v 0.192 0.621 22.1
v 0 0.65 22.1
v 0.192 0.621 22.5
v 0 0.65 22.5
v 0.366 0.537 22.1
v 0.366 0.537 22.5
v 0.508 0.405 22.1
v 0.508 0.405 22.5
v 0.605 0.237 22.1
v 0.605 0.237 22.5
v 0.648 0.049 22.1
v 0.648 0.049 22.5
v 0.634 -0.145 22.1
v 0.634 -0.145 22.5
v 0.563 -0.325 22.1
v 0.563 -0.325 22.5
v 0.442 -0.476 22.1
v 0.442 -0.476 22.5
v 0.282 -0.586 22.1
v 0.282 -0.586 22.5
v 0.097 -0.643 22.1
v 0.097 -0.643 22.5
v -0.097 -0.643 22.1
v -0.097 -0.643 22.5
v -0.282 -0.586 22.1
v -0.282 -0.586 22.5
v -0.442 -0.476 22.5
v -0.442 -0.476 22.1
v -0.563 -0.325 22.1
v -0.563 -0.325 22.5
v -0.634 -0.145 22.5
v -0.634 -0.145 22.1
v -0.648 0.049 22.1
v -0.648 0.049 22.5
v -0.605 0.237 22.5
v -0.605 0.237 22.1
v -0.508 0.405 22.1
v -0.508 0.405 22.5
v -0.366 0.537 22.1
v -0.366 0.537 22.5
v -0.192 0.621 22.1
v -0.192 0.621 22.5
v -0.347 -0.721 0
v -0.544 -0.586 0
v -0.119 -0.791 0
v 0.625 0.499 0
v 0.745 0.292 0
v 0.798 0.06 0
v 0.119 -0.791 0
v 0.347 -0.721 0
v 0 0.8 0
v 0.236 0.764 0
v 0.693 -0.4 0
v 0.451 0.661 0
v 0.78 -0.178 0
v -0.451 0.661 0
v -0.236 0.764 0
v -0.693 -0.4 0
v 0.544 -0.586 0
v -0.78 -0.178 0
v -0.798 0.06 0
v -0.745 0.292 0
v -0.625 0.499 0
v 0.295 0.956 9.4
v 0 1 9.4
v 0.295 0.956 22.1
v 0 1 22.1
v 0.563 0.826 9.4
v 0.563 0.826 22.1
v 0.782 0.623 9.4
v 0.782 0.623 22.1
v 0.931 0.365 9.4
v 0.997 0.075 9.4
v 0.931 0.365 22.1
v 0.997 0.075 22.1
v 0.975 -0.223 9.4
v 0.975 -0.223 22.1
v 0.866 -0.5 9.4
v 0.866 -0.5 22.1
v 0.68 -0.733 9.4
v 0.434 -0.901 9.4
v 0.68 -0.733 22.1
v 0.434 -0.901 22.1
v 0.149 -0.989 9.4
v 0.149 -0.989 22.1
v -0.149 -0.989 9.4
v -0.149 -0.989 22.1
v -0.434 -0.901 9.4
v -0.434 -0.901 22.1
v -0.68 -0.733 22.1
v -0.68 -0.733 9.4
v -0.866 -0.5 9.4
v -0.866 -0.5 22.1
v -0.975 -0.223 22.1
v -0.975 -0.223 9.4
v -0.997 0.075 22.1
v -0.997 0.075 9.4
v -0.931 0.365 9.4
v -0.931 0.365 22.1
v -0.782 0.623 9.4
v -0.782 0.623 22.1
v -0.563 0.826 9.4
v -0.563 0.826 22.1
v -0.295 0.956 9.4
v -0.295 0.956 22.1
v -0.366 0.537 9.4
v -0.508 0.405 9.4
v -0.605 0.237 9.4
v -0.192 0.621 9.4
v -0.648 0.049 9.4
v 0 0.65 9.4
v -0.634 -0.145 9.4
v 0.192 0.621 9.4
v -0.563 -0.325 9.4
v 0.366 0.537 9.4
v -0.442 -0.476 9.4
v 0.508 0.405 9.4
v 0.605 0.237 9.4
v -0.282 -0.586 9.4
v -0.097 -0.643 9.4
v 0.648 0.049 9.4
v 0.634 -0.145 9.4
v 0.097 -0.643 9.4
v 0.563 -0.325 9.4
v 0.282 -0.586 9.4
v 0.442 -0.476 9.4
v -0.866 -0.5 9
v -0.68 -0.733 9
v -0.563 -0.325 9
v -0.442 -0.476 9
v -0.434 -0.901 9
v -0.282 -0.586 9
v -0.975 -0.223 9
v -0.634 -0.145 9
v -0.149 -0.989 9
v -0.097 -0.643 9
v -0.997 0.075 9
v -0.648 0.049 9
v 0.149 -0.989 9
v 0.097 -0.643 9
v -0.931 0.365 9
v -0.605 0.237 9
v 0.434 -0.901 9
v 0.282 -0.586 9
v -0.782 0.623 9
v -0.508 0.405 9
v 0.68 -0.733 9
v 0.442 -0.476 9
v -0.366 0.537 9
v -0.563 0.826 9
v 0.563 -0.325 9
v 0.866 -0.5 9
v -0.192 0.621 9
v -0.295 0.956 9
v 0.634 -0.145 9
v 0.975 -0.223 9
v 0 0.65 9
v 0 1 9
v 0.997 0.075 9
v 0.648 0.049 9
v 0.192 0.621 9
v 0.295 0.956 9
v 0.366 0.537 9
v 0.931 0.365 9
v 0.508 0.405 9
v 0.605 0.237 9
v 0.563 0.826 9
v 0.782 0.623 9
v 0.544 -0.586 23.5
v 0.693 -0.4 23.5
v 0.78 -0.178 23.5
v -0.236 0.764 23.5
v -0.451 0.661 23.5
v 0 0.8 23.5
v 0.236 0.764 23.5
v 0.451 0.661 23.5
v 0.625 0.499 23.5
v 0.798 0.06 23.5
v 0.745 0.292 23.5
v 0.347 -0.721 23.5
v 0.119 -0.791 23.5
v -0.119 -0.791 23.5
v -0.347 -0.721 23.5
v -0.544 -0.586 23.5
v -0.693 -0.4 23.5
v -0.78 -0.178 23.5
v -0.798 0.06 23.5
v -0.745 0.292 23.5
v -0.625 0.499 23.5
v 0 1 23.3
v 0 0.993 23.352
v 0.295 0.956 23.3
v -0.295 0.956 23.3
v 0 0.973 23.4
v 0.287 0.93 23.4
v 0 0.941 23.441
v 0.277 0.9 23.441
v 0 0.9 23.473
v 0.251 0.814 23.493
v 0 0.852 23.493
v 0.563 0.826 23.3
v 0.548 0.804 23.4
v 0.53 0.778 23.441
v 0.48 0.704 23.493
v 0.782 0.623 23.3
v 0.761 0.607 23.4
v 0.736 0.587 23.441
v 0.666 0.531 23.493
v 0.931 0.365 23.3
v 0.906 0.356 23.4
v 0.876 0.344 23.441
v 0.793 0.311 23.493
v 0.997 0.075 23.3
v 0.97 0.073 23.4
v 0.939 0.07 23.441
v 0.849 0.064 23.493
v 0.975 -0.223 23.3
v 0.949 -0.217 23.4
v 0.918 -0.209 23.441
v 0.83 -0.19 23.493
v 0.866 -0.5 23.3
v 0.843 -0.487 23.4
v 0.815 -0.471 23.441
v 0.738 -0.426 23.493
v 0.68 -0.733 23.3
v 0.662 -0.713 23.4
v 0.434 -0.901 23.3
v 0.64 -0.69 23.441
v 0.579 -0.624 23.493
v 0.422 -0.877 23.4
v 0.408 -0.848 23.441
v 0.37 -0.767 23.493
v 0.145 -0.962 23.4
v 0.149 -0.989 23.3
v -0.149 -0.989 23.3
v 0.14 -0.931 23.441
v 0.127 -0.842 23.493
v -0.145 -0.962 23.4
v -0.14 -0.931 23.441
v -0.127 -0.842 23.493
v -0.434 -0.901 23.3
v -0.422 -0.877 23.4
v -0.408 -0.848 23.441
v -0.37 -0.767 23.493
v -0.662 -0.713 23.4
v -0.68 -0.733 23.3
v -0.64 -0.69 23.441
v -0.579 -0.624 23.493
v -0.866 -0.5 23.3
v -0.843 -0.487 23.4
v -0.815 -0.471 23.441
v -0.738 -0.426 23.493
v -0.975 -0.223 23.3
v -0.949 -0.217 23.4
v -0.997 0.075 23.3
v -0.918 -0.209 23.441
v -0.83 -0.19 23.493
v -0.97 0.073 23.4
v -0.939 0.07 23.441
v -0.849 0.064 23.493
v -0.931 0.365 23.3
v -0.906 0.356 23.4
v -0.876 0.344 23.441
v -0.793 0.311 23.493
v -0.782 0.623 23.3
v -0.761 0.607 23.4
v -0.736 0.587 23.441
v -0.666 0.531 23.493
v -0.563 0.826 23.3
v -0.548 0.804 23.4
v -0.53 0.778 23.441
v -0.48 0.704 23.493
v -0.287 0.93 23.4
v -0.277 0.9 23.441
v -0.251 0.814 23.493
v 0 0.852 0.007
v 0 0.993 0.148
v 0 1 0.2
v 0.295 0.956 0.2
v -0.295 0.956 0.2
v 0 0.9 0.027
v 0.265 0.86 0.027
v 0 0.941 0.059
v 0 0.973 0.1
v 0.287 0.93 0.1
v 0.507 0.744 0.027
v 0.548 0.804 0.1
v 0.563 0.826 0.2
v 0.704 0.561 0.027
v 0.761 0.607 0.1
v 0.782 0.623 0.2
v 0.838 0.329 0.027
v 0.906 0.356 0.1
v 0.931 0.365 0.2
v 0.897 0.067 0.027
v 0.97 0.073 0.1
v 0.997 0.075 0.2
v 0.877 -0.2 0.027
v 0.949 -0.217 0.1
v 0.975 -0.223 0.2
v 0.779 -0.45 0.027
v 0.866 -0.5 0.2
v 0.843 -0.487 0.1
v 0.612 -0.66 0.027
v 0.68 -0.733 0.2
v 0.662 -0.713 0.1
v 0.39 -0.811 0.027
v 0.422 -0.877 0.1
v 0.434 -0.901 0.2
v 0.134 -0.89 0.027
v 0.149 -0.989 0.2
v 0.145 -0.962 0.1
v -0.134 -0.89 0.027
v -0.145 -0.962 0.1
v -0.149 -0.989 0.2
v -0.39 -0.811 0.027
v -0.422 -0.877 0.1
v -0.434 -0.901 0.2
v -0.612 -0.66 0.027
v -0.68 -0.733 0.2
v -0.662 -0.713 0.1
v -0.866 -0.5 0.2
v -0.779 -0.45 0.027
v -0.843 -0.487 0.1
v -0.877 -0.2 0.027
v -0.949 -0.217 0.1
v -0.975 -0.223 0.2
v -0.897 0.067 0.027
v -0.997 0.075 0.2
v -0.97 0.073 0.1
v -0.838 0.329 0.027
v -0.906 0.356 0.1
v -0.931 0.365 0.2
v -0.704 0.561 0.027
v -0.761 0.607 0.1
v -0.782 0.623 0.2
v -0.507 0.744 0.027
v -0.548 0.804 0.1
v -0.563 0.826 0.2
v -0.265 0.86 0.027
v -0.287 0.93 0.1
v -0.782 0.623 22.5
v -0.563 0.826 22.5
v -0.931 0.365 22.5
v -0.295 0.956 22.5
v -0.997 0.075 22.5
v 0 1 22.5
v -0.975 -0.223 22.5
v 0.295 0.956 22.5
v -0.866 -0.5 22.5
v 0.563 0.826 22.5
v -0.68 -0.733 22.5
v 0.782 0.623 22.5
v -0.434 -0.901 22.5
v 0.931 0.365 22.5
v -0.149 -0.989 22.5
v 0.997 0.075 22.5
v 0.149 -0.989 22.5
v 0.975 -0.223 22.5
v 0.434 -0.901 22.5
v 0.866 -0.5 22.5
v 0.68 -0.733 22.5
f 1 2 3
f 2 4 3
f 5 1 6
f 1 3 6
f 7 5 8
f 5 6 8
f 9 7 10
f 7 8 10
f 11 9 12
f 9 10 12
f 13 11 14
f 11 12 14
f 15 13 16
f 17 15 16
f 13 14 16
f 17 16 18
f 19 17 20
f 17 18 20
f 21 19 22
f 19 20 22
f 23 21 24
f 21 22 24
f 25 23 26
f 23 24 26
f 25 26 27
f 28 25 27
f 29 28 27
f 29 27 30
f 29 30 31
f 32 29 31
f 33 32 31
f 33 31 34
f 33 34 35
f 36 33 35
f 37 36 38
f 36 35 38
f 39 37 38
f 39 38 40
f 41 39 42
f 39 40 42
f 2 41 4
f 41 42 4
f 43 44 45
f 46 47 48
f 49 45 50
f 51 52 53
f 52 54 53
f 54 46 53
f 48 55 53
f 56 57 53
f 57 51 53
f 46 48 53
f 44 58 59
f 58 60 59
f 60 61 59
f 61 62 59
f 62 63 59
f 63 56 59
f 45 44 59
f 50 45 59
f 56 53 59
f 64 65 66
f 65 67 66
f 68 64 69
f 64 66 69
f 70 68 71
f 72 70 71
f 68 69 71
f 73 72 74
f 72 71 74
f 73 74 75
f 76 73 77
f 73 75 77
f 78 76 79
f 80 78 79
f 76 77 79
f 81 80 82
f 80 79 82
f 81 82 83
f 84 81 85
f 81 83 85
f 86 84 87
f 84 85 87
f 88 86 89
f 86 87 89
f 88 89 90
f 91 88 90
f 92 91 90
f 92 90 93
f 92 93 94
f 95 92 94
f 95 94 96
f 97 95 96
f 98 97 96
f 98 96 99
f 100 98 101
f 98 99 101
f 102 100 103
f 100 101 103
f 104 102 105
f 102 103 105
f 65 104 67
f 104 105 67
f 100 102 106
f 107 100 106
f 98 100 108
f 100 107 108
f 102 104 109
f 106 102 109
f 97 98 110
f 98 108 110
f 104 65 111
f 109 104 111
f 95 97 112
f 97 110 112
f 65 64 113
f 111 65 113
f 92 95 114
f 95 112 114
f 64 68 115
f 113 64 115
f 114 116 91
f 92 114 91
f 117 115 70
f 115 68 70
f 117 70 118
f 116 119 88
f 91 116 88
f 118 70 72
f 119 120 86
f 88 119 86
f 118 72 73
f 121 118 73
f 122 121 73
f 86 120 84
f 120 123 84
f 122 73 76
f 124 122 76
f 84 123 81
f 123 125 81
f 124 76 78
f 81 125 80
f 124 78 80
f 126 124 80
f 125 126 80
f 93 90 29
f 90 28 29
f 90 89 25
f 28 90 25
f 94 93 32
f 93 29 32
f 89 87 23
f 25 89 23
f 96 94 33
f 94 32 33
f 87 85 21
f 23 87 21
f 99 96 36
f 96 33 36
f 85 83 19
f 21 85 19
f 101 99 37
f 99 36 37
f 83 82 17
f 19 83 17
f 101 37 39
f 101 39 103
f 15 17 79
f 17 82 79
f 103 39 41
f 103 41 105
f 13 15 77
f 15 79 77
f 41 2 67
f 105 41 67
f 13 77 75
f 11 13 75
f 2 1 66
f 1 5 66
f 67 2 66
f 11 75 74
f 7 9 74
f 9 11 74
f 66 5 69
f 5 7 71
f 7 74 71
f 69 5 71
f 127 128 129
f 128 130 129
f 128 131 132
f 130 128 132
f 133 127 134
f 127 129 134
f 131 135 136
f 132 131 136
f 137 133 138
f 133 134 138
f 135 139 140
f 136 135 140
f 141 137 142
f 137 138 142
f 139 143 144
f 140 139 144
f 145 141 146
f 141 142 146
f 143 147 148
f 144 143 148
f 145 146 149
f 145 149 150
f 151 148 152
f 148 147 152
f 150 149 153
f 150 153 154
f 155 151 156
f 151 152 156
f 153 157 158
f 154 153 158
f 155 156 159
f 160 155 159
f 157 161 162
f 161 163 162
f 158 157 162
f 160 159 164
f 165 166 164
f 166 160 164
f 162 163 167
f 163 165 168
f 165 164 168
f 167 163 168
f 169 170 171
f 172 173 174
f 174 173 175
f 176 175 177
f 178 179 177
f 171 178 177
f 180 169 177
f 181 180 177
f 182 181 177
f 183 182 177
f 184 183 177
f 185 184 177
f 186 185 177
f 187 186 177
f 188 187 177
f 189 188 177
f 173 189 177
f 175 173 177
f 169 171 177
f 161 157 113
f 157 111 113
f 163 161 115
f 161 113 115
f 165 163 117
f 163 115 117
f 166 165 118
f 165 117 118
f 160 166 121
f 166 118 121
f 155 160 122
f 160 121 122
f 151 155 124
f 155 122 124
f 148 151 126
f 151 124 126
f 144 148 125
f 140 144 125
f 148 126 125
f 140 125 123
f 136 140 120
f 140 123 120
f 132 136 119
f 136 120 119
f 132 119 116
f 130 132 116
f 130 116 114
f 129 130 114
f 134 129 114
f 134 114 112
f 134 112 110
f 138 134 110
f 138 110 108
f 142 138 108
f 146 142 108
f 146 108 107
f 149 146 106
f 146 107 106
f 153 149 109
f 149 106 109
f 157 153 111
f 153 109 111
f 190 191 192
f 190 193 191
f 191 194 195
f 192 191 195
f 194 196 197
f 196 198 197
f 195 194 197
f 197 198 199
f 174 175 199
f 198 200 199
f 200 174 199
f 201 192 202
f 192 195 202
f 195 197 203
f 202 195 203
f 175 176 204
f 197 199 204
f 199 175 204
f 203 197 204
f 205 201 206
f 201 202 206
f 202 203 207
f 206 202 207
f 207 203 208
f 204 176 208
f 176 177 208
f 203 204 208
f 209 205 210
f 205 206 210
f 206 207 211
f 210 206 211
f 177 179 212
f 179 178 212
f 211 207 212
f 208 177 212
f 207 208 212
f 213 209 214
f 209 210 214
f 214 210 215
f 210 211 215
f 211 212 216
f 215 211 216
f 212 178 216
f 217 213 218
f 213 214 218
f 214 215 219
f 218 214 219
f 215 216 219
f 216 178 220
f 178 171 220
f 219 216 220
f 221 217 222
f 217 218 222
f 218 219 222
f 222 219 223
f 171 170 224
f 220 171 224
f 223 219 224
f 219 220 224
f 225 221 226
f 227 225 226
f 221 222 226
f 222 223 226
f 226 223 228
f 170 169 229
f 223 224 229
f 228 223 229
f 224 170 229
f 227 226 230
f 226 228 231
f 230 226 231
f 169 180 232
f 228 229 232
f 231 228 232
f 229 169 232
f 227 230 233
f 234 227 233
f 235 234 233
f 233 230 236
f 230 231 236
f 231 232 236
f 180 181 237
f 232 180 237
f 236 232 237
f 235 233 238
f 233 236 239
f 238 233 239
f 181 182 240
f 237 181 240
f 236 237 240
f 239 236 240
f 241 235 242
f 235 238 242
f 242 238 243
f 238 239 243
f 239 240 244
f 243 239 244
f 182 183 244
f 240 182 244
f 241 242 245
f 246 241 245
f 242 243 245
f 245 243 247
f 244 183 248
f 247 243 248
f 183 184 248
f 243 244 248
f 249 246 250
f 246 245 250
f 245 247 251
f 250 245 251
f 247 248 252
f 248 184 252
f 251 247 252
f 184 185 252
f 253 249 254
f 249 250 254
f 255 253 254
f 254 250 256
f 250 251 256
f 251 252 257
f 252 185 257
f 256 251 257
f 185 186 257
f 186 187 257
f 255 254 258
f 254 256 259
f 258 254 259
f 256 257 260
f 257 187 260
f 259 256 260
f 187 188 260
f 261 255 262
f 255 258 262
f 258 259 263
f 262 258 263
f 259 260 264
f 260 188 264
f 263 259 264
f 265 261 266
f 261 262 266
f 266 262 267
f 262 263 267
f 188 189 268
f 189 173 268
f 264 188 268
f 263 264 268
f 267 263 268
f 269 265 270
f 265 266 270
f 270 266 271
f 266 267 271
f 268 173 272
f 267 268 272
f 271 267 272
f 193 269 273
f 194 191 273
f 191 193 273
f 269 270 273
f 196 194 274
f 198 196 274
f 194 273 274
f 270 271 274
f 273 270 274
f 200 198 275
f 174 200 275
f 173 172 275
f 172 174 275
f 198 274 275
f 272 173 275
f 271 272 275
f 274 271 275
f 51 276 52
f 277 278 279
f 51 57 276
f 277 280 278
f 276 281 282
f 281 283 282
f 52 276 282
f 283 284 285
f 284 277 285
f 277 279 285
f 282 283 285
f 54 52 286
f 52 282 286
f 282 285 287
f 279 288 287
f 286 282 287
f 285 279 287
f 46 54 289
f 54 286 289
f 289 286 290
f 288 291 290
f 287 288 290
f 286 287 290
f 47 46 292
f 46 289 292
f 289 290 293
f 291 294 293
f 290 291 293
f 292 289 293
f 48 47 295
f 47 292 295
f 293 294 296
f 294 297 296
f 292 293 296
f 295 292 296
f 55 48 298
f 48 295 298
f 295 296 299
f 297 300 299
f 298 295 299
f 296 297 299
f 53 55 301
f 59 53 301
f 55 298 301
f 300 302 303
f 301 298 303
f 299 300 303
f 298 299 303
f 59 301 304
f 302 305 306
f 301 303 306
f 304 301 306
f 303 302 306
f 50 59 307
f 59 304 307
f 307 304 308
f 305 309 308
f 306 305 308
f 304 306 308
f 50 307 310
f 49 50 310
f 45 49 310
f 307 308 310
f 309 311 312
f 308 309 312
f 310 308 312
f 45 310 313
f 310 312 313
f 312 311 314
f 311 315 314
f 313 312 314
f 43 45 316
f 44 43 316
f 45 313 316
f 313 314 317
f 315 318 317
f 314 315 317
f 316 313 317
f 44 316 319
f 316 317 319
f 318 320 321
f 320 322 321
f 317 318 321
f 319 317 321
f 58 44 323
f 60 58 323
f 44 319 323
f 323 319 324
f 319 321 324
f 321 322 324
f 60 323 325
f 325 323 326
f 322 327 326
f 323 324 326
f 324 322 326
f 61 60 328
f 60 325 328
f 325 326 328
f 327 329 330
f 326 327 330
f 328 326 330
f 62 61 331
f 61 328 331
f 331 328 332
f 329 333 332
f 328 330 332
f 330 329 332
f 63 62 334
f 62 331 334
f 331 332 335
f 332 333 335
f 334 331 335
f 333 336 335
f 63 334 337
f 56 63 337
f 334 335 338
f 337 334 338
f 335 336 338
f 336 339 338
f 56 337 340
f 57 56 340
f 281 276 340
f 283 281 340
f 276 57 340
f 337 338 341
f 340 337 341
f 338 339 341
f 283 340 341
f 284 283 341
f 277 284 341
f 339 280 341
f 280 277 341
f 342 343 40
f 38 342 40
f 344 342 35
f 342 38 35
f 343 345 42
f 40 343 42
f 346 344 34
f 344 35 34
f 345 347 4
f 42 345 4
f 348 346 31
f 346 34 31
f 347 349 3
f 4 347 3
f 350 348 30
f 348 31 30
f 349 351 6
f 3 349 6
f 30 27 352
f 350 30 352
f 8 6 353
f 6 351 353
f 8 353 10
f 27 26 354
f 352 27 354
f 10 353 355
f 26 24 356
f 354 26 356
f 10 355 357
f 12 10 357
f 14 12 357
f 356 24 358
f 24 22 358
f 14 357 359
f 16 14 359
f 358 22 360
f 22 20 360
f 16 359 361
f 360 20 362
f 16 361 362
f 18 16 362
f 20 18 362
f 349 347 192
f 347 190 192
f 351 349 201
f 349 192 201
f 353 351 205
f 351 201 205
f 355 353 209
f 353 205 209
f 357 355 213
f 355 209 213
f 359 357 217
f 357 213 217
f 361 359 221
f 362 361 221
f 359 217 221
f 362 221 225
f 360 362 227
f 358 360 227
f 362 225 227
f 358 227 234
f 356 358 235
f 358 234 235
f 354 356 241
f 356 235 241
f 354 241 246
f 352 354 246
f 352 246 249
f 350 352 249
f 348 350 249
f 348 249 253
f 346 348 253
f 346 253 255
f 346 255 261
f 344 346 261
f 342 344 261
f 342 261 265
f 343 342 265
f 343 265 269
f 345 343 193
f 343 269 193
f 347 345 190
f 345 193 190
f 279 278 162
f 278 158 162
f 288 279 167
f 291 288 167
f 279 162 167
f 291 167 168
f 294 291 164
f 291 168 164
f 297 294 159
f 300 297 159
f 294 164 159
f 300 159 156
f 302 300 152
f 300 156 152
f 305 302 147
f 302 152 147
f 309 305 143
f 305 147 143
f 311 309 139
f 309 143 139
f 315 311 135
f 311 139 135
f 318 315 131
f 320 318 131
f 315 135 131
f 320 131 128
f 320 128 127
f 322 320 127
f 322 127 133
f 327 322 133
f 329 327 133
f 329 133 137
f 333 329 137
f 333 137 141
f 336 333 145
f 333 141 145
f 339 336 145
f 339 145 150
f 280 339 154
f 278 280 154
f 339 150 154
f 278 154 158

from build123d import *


with BuildPart() as part:
    # Esquisse1 → Révolution1 (revolve)
    with BuildSketch(Plane(origin=(0, 0, 0), x_dir=(0, 0, -1), z_dir=(1, 0, 0))):
        with BuildLine():
            Line((0, 0), (0, 0.8))
            ThreePointArc((0, 0.8), (-0.058578644, 0.941421356), (-0.2, 1))
            Line((-0.2, 1), (-9, 1))
            Line((-9, 1), (-9, 0.65))
            Line((-9, 0.65), (-9.4, 0.65))
            Line((-9.4, 0.65), (-9.4, 1))
            Line((-9.4, 1), (-22.1, 1))
            Line((-22.1, 1), (-22.1, 0.65))
            Line((-22.1, 0.65), (-22.5, 0.65))
            Line((-22.5, 0.65), (-22.5, 1))
            Line((-22.5, 1), (-23.3, 1))
            ThreePointArc((-23.3, 1), (-23.441421356, 0.941421356), (-23.5, 0.8))
            Line((-23.5, 0.8), (-23.5, 0))
            Line((-23.5, 0), (0, 0))
        make_face()
    revolve(axis=Axis((0, 0, 23.5), (0, 0, -1)))


solid = part.part
